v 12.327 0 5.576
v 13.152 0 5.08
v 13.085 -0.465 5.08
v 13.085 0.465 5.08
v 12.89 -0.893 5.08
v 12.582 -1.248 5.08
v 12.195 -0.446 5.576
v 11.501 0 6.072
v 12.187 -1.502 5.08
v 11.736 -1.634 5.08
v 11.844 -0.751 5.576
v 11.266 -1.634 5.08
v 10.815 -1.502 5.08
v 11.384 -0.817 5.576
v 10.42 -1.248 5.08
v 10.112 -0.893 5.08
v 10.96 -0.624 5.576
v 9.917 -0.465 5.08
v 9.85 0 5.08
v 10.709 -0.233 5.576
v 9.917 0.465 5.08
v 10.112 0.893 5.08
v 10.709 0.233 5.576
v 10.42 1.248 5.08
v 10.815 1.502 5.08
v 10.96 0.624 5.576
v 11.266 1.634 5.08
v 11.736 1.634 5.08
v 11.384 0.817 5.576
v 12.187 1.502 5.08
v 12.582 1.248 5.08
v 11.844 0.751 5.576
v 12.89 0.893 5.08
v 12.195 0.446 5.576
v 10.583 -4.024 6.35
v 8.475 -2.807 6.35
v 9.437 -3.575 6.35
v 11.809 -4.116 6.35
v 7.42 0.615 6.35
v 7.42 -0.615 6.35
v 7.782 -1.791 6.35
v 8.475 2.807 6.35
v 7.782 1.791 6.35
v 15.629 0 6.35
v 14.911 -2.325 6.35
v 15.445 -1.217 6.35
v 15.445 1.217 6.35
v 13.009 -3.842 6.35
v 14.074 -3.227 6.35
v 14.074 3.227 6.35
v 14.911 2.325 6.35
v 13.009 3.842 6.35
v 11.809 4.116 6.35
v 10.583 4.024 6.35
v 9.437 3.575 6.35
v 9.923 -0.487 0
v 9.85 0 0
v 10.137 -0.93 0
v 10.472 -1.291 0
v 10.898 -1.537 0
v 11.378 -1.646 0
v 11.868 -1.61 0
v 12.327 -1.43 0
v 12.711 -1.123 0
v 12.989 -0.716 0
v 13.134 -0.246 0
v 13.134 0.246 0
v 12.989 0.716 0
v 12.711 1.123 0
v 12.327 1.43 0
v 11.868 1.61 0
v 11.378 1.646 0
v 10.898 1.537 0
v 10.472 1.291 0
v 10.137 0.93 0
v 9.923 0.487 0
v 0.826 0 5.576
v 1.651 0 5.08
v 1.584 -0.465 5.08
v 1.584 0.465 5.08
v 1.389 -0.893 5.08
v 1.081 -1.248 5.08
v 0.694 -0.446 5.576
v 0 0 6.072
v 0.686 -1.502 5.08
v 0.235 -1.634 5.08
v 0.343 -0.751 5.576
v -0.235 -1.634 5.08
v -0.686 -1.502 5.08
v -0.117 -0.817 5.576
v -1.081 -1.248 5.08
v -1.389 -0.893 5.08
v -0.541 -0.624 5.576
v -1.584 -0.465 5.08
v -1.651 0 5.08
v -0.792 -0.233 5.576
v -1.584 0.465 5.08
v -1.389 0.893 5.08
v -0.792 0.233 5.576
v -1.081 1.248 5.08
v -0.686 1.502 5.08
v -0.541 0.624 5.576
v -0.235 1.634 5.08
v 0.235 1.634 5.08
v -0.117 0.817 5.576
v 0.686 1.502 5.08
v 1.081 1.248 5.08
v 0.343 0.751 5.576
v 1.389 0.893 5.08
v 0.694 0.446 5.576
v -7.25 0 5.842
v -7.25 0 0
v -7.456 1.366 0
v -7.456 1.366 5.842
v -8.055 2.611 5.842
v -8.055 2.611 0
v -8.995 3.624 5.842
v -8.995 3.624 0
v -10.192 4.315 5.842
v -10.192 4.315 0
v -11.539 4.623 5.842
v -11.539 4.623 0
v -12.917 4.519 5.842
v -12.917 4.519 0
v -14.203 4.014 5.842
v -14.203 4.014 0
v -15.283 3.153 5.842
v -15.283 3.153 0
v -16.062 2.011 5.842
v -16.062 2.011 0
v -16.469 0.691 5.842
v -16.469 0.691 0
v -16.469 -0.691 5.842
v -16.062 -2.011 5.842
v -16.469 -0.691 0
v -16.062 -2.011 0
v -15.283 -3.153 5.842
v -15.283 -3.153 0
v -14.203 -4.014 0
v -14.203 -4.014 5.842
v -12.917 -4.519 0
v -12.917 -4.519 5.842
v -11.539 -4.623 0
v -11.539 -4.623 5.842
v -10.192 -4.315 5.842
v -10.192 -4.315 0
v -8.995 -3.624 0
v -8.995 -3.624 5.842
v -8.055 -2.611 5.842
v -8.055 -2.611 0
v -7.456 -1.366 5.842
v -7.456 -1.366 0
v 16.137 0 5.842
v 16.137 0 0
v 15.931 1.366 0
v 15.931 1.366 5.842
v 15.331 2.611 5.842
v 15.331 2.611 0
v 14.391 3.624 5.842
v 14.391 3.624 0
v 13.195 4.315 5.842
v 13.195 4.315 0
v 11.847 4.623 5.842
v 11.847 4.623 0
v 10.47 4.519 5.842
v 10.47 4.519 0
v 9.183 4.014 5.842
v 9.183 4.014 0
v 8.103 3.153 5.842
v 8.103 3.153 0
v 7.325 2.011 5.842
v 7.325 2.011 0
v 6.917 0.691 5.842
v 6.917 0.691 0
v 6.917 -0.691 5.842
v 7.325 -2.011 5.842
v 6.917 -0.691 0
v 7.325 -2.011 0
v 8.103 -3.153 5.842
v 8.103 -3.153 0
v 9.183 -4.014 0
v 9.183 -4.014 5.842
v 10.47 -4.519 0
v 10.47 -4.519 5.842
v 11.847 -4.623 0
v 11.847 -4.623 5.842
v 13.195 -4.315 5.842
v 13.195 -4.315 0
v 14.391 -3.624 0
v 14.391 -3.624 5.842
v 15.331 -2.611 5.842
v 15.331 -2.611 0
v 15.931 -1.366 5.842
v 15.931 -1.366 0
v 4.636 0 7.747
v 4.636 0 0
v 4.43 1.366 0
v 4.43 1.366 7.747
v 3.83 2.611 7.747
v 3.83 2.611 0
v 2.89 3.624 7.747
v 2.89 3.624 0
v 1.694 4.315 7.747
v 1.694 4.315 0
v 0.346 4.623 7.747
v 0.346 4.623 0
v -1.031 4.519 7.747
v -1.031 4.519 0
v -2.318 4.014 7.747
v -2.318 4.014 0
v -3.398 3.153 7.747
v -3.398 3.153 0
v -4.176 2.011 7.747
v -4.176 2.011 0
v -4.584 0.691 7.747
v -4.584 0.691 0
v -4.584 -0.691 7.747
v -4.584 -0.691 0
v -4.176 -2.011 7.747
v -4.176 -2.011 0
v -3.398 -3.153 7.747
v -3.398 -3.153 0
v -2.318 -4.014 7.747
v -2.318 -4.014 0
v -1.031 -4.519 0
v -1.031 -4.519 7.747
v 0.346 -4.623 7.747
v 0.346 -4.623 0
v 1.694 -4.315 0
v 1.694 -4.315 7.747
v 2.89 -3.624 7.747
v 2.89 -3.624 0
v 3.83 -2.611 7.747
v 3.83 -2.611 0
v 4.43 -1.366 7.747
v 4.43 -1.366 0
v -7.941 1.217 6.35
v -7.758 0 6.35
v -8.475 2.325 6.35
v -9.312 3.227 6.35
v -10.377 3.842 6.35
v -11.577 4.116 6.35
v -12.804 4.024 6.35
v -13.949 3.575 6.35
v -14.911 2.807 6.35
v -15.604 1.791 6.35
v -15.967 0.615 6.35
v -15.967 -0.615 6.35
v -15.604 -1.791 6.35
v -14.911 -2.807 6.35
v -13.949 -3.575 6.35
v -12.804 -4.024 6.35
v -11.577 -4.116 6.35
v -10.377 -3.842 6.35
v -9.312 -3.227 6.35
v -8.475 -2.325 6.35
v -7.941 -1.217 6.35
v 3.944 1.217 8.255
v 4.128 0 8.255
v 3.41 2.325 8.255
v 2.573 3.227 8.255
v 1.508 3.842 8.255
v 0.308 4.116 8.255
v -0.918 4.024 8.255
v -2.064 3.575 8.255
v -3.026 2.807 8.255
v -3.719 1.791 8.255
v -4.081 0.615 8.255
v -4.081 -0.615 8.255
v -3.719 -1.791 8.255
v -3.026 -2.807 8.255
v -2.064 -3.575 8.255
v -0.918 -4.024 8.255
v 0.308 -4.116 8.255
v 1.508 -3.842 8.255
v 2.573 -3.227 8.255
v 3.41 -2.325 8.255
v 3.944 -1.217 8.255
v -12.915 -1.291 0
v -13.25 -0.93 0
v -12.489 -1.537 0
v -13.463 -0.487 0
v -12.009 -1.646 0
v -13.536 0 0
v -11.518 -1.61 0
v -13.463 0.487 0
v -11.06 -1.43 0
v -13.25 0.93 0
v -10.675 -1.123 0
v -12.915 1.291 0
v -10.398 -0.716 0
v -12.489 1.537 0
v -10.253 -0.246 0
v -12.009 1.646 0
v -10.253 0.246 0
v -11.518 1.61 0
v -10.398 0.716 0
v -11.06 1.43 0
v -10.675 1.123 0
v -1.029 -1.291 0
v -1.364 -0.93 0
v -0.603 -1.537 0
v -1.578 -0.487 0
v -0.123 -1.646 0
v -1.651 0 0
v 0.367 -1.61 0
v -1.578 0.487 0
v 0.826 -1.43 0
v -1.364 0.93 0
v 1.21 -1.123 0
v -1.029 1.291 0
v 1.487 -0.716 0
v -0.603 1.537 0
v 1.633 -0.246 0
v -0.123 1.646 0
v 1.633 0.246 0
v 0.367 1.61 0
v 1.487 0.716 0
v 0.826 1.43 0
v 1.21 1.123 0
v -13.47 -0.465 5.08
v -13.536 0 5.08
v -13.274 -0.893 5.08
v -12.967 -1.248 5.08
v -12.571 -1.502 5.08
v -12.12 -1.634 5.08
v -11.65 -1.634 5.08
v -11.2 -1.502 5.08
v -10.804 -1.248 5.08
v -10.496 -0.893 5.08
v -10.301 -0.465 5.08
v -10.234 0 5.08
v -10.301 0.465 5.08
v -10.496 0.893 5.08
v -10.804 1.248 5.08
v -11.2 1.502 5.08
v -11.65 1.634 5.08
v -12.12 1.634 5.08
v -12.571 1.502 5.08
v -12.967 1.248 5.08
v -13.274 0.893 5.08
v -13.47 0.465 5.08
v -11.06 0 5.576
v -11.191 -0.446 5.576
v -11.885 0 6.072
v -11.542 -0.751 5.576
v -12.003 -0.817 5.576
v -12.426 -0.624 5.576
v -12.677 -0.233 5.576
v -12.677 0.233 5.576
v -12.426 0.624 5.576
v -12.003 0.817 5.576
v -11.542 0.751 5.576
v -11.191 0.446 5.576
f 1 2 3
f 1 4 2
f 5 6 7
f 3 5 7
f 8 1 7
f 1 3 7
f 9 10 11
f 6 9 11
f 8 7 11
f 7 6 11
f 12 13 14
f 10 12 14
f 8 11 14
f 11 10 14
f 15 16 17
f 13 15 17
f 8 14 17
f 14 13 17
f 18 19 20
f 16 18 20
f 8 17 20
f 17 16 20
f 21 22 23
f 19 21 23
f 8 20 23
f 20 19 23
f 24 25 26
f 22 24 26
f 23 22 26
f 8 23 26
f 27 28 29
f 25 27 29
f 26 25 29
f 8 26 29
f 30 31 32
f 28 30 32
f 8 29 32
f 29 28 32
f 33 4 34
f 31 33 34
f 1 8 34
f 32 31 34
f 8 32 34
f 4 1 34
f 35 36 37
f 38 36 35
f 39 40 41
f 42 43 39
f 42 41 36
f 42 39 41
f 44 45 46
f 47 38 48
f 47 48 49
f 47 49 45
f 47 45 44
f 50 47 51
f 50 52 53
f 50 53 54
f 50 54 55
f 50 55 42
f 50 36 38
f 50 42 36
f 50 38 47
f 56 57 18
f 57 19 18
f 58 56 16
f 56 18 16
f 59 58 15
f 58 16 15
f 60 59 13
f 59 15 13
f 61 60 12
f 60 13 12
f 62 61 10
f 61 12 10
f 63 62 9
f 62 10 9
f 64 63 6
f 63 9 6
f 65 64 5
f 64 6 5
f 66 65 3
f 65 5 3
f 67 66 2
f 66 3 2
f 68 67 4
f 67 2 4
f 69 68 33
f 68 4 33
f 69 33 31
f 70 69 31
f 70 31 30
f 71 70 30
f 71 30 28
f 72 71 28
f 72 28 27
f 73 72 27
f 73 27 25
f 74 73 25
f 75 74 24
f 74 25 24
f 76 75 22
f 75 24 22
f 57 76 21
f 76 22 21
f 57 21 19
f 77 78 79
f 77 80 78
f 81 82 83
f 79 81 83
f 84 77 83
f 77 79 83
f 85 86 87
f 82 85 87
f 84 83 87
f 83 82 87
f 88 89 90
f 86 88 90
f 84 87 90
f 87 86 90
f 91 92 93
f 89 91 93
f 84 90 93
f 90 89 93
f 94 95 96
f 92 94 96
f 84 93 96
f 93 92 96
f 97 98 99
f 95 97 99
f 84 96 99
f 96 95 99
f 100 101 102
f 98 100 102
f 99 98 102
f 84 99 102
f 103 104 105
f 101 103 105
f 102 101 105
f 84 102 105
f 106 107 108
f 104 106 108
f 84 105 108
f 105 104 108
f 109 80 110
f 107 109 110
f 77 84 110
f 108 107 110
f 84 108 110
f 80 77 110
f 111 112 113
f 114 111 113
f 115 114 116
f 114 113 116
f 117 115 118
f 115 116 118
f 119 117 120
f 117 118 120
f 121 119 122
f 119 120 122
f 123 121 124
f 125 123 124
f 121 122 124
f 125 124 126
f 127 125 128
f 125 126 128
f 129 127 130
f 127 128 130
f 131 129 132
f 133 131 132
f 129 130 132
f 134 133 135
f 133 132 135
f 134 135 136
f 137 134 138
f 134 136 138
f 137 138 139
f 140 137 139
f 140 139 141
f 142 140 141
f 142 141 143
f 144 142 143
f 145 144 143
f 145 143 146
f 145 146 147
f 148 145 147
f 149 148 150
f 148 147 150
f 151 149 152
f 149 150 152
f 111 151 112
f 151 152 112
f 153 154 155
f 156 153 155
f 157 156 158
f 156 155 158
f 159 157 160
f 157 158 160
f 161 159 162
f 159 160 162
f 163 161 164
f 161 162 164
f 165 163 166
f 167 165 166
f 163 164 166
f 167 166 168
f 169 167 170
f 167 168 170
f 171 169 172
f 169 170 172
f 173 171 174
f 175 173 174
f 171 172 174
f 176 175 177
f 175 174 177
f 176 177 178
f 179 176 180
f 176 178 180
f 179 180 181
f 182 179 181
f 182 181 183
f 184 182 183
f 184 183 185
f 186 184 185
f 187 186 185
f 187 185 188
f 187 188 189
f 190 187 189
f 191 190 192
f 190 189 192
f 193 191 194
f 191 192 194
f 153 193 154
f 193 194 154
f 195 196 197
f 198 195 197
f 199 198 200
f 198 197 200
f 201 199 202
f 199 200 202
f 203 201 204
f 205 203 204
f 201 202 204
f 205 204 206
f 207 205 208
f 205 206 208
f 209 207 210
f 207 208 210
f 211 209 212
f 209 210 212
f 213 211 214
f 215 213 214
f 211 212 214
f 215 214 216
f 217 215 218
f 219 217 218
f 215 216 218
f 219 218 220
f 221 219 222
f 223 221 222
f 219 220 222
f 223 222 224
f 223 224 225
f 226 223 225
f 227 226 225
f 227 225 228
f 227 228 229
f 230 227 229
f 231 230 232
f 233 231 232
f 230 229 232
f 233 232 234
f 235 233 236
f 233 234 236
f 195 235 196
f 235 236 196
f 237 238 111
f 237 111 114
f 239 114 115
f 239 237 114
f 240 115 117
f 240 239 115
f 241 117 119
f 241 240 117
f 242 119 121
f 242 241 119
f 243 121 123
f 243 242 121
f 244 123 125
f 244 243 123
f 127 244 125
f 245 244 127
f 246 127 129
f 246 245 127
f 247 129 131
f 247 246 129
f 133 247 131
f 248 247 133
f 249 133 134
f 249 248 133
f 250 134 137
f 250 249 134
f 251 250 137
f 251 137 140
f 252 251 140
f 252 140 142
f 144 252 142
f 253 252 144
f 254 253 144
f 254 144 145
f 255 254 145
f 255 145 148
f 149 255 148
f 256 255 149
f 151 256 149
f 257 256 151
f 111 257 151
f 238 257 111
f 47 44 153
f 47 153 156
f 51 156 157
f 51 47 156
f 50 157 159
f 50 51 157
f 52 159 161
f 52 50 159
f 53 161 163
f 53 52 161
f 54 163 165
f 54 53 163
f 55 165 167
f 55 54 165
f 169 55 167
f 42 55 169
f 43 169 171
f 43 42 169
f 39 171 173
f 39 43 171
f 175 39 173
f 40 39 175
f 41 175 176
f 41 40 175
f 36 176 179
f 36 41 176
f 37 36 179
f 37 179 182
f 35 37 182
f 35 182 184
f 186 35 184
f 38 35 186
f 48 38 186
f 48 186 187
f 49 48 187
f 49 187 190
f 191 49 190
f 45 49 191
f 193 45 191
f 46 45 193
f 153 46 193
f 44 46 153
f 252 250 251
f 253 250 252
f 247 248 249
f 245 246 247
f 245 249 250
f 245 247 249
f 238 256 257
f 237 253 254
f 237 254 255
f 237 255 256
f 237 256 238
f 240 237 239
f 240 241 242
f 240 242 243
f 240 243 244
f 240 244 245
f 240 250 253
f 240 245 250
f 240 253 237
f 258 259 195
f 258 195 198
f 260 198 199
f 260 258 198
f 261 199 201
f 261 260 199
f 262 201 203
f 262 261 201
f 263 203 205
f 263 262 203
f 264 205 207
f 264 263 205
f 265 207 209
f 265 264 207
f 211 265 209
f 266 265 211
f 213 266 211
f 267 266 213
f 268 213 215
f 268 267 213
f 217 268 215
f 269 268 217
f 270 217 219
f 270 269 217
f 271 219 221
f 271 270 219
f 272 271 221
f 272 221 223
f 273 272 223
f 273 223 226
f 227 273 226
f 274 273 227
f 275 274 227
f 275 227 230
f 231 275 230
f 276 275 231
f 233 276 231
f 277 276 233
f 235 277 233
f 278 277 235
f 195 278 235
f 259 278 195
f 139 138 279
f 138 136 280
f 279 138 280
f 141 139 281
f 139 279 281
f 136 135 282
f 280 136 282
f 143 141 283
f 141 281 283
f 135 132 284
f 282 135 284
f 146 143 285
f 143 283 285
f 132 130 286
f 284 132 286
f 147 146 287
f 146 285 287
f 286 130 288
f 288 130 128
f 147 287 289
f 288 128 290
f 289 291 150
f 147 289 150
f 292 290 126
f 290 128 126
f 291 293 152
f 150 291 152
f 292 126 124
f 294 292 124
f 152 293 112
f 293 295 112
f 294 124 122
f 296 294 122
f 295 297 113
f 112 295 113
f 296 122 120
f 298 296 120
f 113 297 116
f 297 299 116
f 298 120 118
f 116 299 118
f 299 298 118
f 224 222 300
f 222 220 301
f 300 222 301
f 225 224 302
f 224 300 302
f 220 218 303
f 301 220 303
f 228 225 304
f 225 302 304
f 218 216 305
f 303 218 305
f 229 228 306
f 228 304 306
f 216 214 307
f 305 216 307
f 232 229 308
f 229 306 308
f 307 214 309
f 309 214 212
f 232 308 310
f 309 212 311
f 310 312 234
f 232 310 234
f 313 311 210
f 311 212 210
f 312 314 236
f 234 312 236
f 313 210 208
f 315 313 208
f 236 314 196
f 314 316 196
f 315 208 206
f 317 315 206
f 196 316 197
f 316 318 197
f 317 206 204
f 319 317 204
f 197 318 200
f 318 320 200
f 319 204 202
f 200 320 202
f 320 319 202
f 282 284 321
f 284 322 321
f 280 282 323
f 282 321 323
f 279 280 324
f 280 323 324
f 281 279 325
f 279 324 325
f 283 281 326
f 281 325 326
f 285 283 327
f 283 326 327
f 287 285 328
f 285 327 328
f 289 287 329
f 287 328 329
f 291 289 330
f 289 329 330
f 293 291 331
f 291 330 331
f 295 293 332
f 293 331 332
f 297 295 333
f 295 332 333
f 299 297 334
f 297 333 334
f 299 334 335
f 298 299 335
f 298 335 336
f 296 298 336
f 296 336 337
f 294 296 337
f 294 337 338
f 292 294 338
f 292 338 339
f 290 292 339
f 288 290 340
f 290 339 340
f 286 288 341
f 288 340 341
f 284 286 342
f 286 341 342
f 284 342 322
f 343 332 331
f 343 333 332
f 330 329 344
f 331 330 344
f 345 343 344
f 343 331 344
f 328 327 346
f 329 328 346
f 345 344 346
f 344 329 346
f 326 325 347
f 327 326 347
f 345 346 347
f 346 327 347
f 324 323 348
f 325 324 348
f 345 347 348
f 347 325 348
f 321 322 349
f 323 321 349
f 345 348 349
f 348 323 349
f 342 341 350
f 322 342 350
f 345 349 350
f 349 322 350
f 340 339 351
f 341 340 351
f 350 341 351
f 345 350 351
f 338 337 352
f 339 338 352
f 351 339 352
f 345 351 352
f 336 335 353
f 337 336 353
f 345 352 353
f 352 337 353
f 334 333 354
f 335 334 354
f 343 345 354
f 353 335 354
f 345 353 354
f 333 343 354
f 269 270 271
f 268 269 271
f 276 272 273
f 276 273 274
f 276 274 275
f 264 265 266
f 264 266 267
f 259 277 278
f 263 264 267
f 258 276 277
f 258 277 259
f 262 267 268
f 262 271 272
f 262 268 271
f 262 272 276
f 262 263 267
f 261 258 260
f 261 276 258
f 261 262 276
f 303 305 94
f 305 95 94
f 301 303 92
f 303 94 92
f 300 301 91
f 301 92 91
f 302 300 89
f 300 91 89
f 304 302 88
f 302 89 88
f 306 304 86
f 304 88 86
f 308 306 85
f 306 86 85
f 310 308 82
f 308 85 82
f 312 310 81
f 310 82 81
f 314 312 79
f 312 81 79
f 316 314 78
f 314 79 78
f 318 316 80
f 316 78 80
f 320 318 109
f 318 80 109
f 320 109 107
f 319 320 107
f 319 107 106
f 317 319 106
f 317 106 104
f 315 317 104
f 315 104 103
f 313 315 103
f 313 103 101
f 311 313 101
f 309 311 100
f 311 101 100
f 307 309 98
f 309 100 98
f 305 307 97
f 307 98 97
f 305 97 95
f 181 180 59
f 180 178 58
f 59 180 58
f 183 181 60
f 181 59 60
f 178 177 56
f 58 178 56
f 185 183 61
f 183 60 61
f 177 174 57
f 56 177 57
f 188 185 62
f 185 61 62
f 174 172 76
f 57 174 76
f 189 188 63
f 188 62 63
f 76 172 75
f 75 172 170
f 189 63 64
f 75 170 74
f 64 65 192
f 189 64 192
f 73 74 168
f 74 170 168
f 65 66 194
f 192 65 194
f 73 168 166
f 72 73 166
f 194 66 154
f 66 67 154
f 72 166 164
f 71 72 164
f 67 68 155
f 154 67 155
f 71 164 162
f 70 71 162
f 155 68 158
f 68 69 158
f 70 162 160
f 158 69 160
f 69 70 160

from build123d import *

# Parameters (mm, degrees)
F0_R       = 4.6355
F1_DEPTH   = 6.35
F2_DEPTH   = 8.255
F3_SIZE    = 0.508
F3_2_SIZE  = 0.508
F3_3_SIZE  = 0.508
F4_D       = 3.302
F4_DEPTH   = 5.08
F4_TIP     = 0.992020882
F4_2_D     = 3.302
F4_2_DEPTH = 5.08
F4_2_TIP   = 0.992020882
F4_3_D     = 3.302
F4_3_DEPTH = 5.08
F4_3_TIP   = 0.992020882


with BuildPart() as f1:
    # F0 (on Top) → F1 (new body)
    with BuildSketch(Plane.XY):
        with Locations((-11.8854027241, 0)):
            Circle(F0_R)
    extrude(amount=F1_DEPTH)

    # F3
    f3_edges = [f1.edges().sort_by_distance(p)[0] for p in [
        (-16.520903, 0, 6.35),
    ]]
    chamfer(f3_edges, length=F3_SIZE)

    # F4
    with Locations(Plane(origin=(0, 0, 0), x_dir=(1, 0, 0), z_dir=(0, 0, -1))):
        with Locations((-11.8854027241, 0), (0, 0), (11.501041241, 0)):
            Hole(F4_D / 2, depth=F4_DEPTH)
            with Locations((0, 0, -(F4_DEPTH + F4_TIP / 2))):  # 118° drill point
                Cone(0, F4_D / 2, F4_TIP, mode=Mode.SUBTRACT)


with BuildPart() as f1b:
    # F0 (on Top) → F1, piece 2 (new body)
    with BuildSketch(Plane.XY):
        with Locations((11.501041241, 0)):
            Circle(F0_R)
    extrude(amount=F1_DEPTH)

    # F3#3
    f3_3_edges = [f1b.edges().sort_by_distance(p)[0] for p in [
        (6.865541, 0, 6.35),
    ]]
    chamfer(f3_3_edges, length=F3_3_SIZE)

    # F4#2
    with Locations(Plane(origin=(0, 0, 0), x_dir=(1, 0, 0), z_dir=(0, 0, -1))):
        with Locations((-11.8854027241, 0), (0, 0), (11.501041241, 0)):
            Hole(F4_2_D / 2, depth=F4_2_DEPTH)
            with Locations((0, 0, -(F4_2_DEPTH + F4_2_TIP / 2))):  # 118° drill point
                Cone(0, F4_2_D / 2, F4_2_TIP, mode=Mode.SUBTRACT)


with BuildPart() as f2:
    # F0 (on Top) → F2 (new body)
    with BuildSketch(Plane.XY):
        with BuildLine():
            ThreePointArc((-4.6355, 0), (0, -4.6355), (4.6355, 0))
            Line((4.6355, 0), (-4.6355, 0))
        make_face()
        with BuildLine():
            Line((-4.6355, 0), (4.6355, 0))
            ThreePointArc((4.6355, 0), (0, 4.6355), (-4.6355, 0))
        make_face()
    extrude(amount=F2_DEPTH)

    # F3#2
    f3_2_edges = [f2.edges().sort_by_distance(p)[0] for p in [
        (-4.6355, 0, 8.255),
    ]]
    chamfer(f3_2_edges, length=F3_2_SIZE)

    # F4#3
    with Locations(Plane(origin=(0, 0, 0), x_dir=(1, 0, 0), z_dir=(0, 0, -1))):
        with Locations((-11.8854027241, 0), (0, 0), (11.501041241, 0)):
            Hole(F4_3_D / 2, depth=F4_3_DEPTH)
            with Locations((0, 0, -(F4_3_DEPTH + F4_3_TIP / 2))):  # 118° drill point
                Cone(0, F4_3_D / 2, F4_3_TIP, mode=Mode.SUBTRACT)


solid = Compound([f1.part, f1b.part, f2.part])
